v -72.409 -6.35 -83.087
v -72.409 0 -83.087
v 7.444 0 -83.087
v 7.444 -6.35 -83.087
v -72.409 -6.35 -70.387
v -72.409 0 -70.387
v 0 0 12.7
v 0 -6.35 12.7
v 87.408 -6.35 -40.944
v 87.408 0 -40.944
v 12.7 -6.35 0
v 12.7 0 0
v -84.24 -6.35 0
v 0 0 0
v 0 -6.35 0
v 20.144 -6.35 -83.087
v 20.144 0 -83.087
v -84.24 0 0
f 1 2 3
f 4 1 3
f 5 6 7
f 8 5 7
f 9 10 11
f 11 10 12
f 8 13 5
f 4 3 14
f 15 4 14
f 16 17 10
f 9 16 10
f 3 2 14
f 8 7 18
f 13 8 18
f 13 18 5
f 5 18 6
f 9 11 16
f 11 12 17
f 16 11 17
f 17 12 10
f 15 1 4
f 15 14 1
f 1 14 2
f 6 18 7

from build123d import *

# Parameters (mm, degrees)
F2_DEPTH = 6.35


with BuildPart() as f2:
    # F1 (on Front) → F2 (new body)
    with BuildSketch(Plane.XZ):
        Polygon((-72.408525, -70.386592), (0, 12.7), (-84.23965, 0), align=None)
        Polygon((-72.408525, -83.086592), (7.443995, -83.086592), (0, 0), align=None)
        Polygon((20.143995, -83.086592), (87.4075, -40.943841), (12.7, 0), align=None)
    extrude(amount=F2_DEPTH)


solid = f2.part
